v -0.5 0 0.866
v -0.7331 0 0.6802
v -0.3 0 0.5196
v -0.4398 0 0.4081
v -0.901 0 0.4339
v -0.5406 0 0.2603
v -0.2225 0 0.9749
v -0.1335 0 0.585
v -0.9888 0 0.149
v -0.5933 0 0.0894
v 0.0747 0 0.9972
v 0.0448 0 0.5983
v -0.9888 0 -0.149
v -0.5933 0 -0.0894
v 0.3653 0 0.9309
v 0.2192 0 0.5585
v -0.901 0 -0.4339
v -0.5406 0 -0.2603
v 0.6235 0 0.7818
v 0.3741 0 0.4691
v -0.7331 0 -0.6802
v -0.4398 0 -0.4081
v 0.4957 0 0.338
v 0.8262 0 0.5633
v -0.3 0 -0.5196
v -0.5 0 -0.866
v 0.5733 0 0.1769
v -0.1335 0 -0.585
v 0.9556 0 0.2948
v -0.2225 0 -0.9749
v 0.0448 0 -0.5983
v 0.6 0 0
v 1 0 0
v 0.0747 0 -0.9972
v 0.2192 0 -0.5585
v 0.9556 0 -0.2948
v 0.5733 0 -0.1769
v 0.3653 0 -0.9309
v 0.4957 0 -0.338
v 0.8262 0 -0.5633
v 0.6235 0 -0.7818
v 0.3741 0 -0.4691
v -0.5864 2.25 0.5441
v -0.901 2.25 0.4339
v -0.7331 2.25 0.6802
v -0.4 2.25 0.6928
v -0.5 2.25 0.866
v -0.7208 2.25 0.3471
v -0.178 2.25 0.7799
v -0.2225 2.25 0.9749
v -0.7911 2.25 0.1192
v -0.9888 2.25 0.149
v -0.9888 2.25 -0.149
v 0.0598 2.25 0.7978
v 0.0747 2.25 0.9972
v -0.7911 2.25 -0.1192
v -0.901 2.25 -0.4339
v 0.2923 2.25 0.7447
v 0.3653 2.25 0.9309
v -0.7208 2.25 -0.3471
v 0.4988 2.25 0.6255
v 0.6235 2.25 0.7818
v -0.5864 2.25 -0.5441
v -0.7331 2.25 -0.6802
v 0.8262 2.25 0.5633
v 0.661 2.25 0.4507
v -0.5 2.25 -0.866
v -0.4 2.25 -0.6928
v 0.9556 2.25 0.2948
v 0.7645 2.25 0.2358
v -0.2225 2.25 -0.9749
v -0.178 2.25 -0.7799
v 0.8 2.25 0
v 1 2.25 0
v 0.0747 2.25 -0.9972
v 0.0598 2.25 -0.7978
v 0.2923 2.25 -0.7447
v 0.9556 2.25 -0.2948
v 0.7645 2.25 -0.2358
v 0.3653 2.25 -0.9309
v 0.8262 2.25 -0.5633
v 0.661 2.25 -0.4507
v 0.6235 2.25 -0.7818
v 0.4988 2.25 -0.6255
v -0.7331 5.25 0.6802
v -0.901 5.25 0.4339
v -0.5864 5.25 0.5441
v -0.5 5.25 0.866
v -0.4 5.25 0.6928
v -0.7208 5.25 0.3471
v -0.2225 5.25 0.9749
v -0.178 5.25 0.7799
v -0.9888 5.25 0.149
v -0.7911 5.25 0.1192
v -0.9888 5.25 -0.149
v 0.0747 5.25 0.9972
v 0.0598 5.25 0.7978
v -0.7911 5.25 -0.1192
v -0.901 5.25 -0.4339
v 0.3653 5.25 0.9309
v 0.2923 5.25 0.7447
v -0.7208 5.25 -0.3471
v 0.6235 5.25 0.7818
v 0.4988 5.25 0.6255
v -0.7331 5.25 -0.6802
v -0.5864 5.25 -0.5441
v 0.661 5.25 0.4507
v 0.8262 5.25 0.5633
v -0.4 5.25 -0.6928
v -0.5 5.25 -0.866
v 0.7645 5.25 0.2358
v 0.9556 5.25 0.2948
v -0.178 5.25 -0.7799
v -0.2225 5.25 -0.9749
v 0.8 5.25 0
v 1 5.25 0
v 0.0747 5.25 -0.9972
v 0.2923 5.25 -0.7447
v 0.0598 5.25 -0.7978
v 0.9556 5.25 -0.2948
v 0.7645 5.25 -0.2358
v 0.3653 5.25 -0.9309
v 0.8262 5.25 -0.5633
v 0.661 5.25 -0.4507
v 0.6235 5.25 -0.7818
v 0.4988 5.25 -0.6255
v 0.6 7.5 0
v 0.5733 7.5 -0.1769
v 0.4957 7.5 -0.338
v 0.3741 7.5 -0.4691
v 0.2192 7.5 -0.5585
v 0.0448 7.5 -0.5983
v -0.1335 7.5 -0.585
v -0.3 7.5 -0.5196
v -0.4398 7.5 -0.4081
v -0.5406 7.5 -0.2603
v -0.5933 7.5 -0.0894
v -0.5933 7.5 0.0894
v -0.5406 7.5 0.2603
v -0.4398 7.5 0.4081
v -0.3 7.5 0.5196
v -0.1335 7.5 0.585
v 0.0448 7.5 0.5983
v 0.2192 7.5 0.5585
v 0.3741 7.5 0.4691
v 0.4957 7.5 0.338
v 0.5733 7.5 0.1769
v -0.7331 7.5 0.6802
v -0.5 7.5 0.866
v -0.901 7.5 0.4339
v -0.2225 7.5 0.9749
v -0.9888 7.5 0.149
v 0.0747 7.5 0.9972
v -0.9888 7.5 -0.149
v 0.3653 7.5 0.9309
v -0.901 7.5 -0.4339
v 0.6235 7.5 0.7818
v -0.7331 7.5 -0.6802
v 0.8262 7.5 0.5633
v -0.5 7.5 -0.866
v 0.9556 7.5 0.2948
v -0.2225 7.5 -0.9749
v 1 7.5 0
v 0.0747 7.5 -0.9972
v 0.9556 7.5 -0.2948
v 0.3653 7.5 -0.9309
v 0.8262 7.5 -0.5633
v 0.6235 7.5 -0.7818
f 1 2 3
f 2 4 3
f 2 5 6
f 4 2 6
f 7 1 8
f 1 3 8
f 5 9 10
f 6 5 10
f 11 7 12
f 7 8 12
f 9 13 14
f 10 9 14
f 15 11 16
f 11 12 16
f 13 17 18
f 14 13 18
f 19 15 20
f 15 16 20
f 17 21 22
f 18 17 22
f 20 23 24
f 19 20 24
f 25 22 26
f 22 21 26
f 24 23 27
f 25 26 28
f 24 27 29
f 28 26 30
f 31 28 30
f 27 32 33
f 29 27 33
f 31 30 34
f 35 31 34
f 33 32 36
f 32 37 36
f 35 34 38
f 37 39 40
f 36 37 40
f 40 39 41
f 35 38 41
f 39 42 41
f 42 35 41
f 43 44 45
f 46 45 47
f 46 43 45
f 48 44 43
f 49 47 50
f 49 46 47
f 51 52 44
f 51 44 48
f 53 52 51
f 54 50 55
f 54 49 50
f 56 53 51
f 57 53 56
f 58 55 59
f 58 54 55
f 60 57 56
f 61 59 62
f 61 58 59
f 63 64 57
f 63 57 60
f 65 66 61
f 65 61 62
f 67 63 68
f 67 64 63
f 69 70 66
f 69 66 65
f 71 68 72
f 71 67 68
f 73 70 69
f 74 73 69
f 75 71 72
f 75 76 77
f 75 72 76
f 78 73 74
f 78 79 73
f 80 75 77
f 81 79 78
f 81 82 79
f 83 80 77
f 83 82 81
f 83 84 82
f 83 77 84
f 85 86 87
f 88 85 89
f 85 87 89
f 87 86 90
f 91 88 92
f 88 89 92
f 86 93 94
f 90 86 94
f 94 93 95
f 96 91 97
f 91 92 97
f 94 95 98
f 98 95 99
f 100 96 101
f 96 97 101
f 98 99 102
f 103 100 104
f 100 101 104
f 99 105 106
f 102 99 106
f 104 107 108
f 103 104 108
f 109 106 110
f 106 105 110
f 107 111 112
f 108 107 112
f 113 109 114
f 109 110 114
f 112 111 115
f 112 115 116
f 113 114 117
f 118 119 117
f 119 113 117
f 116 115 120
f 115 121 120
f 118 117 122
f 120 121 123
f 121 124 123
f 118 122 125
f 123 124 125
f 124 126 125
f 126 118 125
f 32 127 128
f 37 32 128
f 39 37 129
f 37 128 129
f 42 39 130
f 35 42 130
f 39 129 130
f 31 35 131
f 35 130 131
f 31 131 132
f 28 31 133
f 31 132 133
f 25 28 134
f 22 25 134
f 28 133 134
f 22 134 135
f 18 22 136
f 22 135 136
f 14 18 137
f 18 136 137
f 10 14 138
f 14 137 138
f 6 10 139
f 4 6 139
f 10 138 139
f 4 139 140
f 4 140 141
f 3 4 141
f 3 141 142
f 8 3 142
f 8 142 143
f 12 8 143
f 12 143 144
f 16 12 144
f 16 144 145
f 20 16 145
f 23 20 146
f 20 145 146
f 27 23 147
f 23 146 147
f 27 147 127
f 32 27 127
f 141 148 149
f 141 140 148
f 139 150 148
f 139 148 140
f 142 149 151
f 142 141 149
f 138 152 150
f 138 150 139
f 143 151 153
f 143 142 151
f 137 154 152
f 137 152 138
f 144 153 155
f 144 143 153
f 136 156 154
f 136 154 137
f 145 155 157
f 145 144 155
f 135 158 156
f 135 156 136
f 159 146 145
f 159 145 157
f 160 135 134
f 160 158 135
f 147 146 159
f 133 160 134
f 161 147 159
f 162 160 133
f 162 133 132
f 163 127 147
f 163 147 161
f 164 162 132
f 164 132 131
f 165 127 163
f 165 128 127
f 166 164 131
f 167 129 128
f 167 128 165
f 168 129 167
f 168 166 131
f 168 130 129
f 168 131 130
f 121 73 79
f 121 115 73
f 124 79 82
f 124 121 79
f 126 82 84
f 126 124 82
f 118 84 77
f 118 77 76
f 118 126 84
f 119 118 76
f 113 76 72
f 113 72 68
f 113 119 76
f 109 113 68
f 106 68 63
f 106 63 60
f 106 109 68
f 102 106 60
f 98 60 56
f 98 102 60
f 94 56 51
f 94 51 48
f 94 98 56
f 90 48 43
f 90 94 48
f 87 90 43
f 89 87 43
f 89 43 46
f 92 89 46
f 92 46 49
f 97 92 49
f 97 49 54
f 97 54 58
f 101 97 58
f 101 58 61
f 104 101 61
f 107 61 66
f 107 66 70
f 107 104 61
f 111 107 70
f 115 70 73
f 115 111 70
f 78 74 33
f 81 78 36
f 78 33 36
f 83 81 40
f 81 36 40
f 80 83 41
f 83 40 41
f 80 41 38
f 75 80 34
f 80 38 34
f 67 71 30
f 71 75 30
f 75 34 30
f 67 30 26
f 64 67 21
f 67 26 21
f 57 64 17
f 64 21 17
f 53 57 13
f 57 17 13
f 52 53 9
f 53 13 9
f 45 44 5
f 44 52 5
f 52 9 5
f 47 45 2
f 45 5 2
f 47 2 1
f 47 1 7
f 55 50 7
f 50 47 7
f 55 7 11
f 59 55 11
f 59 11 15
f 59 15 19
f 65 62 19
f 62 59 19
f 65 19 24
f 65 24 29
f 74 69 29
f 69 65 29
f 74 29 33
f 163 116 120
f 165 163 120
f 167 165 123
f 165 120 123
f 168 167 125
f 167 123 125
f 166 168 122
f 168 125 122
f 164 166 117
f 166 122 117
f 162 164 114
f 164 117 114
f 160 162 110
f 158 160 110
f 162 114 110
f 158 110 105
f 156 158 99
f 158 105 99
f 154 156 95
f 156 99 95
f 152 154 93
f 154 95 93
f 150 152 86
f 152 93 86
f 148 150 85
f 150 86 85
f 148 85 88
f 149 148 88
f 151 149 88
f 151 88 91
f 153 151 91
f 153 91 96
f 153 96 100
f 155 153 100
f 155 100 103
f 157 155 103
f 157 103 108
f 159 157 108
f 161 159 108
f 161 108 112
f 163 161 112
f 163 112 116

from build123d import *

# Parameters (mm, degrees)
SKETCH2_R               = 1
BOSS_EXTRUDE1_DEPTH     = 7.5
SKETCH4_OUTSIDE_W       = 5.604
SKETCH4_OUTSIDE_H       = 5.604
SKETCH4_OUTSIDE_R       = 0.8
CUT_EXTRUDE1_DEPTH      = 1.5
CUT_EXTRUDE1_DEPTH_BACK = 1.5
SKETCH5_R               = 0.6
CUT_EXTRUDE2_DEPTH      = 7.5


with BuildPart() as part:
    # Sketch2 → Boss-Extrude1 (new body)
    with BuildSketch(Plane(origin=(0, 0, 0), x_dir=(1, 0, 0), z_dir=(0, 1, 0))):
        Circle(SKETCH2_R)
    extrude(amount=BOSS_EXTRUDE1_DEPTH)

    # Sketch4 outside → Cut-Extrude1 (cut, two sides)
    with BuildSketch(Plane(origin=(0, 3.75, 0), x_dir=(1, 0, 0), z_dir=(0, 1, 0))) as cut_extrude1_sk:
        Rectangle(SKETCH4_OUTSIDE_W, SKETCH4_OUTSIDE_H)
        Circle(SKETCH4_OUTSIDE_R, mode=Mode.SUBTRACT)
    extrude(amount=CUT_EXTRUDE1_DEPTH, mode=Mode.SUBTRACT)
    extrude(cut_extrude1_sk.sketch, amount=-CUT_EXTRUDE1_DEPTH_BACK, mode=Mode.SUBTRACT)

    # Sketch5 → Cut-Extrude2 (cut)
    with BuildSketch(Plane(origin=(0, 7.5, 0), x_dir=(1, 0, 0), z_dir=(0, 1, 0))):
        Circle(SKETCH5_R)
    extrude(amount=-CUT_EXTRUDE2_DEPTH, mode=Mode.SUBTRACT)


solid = part.part
